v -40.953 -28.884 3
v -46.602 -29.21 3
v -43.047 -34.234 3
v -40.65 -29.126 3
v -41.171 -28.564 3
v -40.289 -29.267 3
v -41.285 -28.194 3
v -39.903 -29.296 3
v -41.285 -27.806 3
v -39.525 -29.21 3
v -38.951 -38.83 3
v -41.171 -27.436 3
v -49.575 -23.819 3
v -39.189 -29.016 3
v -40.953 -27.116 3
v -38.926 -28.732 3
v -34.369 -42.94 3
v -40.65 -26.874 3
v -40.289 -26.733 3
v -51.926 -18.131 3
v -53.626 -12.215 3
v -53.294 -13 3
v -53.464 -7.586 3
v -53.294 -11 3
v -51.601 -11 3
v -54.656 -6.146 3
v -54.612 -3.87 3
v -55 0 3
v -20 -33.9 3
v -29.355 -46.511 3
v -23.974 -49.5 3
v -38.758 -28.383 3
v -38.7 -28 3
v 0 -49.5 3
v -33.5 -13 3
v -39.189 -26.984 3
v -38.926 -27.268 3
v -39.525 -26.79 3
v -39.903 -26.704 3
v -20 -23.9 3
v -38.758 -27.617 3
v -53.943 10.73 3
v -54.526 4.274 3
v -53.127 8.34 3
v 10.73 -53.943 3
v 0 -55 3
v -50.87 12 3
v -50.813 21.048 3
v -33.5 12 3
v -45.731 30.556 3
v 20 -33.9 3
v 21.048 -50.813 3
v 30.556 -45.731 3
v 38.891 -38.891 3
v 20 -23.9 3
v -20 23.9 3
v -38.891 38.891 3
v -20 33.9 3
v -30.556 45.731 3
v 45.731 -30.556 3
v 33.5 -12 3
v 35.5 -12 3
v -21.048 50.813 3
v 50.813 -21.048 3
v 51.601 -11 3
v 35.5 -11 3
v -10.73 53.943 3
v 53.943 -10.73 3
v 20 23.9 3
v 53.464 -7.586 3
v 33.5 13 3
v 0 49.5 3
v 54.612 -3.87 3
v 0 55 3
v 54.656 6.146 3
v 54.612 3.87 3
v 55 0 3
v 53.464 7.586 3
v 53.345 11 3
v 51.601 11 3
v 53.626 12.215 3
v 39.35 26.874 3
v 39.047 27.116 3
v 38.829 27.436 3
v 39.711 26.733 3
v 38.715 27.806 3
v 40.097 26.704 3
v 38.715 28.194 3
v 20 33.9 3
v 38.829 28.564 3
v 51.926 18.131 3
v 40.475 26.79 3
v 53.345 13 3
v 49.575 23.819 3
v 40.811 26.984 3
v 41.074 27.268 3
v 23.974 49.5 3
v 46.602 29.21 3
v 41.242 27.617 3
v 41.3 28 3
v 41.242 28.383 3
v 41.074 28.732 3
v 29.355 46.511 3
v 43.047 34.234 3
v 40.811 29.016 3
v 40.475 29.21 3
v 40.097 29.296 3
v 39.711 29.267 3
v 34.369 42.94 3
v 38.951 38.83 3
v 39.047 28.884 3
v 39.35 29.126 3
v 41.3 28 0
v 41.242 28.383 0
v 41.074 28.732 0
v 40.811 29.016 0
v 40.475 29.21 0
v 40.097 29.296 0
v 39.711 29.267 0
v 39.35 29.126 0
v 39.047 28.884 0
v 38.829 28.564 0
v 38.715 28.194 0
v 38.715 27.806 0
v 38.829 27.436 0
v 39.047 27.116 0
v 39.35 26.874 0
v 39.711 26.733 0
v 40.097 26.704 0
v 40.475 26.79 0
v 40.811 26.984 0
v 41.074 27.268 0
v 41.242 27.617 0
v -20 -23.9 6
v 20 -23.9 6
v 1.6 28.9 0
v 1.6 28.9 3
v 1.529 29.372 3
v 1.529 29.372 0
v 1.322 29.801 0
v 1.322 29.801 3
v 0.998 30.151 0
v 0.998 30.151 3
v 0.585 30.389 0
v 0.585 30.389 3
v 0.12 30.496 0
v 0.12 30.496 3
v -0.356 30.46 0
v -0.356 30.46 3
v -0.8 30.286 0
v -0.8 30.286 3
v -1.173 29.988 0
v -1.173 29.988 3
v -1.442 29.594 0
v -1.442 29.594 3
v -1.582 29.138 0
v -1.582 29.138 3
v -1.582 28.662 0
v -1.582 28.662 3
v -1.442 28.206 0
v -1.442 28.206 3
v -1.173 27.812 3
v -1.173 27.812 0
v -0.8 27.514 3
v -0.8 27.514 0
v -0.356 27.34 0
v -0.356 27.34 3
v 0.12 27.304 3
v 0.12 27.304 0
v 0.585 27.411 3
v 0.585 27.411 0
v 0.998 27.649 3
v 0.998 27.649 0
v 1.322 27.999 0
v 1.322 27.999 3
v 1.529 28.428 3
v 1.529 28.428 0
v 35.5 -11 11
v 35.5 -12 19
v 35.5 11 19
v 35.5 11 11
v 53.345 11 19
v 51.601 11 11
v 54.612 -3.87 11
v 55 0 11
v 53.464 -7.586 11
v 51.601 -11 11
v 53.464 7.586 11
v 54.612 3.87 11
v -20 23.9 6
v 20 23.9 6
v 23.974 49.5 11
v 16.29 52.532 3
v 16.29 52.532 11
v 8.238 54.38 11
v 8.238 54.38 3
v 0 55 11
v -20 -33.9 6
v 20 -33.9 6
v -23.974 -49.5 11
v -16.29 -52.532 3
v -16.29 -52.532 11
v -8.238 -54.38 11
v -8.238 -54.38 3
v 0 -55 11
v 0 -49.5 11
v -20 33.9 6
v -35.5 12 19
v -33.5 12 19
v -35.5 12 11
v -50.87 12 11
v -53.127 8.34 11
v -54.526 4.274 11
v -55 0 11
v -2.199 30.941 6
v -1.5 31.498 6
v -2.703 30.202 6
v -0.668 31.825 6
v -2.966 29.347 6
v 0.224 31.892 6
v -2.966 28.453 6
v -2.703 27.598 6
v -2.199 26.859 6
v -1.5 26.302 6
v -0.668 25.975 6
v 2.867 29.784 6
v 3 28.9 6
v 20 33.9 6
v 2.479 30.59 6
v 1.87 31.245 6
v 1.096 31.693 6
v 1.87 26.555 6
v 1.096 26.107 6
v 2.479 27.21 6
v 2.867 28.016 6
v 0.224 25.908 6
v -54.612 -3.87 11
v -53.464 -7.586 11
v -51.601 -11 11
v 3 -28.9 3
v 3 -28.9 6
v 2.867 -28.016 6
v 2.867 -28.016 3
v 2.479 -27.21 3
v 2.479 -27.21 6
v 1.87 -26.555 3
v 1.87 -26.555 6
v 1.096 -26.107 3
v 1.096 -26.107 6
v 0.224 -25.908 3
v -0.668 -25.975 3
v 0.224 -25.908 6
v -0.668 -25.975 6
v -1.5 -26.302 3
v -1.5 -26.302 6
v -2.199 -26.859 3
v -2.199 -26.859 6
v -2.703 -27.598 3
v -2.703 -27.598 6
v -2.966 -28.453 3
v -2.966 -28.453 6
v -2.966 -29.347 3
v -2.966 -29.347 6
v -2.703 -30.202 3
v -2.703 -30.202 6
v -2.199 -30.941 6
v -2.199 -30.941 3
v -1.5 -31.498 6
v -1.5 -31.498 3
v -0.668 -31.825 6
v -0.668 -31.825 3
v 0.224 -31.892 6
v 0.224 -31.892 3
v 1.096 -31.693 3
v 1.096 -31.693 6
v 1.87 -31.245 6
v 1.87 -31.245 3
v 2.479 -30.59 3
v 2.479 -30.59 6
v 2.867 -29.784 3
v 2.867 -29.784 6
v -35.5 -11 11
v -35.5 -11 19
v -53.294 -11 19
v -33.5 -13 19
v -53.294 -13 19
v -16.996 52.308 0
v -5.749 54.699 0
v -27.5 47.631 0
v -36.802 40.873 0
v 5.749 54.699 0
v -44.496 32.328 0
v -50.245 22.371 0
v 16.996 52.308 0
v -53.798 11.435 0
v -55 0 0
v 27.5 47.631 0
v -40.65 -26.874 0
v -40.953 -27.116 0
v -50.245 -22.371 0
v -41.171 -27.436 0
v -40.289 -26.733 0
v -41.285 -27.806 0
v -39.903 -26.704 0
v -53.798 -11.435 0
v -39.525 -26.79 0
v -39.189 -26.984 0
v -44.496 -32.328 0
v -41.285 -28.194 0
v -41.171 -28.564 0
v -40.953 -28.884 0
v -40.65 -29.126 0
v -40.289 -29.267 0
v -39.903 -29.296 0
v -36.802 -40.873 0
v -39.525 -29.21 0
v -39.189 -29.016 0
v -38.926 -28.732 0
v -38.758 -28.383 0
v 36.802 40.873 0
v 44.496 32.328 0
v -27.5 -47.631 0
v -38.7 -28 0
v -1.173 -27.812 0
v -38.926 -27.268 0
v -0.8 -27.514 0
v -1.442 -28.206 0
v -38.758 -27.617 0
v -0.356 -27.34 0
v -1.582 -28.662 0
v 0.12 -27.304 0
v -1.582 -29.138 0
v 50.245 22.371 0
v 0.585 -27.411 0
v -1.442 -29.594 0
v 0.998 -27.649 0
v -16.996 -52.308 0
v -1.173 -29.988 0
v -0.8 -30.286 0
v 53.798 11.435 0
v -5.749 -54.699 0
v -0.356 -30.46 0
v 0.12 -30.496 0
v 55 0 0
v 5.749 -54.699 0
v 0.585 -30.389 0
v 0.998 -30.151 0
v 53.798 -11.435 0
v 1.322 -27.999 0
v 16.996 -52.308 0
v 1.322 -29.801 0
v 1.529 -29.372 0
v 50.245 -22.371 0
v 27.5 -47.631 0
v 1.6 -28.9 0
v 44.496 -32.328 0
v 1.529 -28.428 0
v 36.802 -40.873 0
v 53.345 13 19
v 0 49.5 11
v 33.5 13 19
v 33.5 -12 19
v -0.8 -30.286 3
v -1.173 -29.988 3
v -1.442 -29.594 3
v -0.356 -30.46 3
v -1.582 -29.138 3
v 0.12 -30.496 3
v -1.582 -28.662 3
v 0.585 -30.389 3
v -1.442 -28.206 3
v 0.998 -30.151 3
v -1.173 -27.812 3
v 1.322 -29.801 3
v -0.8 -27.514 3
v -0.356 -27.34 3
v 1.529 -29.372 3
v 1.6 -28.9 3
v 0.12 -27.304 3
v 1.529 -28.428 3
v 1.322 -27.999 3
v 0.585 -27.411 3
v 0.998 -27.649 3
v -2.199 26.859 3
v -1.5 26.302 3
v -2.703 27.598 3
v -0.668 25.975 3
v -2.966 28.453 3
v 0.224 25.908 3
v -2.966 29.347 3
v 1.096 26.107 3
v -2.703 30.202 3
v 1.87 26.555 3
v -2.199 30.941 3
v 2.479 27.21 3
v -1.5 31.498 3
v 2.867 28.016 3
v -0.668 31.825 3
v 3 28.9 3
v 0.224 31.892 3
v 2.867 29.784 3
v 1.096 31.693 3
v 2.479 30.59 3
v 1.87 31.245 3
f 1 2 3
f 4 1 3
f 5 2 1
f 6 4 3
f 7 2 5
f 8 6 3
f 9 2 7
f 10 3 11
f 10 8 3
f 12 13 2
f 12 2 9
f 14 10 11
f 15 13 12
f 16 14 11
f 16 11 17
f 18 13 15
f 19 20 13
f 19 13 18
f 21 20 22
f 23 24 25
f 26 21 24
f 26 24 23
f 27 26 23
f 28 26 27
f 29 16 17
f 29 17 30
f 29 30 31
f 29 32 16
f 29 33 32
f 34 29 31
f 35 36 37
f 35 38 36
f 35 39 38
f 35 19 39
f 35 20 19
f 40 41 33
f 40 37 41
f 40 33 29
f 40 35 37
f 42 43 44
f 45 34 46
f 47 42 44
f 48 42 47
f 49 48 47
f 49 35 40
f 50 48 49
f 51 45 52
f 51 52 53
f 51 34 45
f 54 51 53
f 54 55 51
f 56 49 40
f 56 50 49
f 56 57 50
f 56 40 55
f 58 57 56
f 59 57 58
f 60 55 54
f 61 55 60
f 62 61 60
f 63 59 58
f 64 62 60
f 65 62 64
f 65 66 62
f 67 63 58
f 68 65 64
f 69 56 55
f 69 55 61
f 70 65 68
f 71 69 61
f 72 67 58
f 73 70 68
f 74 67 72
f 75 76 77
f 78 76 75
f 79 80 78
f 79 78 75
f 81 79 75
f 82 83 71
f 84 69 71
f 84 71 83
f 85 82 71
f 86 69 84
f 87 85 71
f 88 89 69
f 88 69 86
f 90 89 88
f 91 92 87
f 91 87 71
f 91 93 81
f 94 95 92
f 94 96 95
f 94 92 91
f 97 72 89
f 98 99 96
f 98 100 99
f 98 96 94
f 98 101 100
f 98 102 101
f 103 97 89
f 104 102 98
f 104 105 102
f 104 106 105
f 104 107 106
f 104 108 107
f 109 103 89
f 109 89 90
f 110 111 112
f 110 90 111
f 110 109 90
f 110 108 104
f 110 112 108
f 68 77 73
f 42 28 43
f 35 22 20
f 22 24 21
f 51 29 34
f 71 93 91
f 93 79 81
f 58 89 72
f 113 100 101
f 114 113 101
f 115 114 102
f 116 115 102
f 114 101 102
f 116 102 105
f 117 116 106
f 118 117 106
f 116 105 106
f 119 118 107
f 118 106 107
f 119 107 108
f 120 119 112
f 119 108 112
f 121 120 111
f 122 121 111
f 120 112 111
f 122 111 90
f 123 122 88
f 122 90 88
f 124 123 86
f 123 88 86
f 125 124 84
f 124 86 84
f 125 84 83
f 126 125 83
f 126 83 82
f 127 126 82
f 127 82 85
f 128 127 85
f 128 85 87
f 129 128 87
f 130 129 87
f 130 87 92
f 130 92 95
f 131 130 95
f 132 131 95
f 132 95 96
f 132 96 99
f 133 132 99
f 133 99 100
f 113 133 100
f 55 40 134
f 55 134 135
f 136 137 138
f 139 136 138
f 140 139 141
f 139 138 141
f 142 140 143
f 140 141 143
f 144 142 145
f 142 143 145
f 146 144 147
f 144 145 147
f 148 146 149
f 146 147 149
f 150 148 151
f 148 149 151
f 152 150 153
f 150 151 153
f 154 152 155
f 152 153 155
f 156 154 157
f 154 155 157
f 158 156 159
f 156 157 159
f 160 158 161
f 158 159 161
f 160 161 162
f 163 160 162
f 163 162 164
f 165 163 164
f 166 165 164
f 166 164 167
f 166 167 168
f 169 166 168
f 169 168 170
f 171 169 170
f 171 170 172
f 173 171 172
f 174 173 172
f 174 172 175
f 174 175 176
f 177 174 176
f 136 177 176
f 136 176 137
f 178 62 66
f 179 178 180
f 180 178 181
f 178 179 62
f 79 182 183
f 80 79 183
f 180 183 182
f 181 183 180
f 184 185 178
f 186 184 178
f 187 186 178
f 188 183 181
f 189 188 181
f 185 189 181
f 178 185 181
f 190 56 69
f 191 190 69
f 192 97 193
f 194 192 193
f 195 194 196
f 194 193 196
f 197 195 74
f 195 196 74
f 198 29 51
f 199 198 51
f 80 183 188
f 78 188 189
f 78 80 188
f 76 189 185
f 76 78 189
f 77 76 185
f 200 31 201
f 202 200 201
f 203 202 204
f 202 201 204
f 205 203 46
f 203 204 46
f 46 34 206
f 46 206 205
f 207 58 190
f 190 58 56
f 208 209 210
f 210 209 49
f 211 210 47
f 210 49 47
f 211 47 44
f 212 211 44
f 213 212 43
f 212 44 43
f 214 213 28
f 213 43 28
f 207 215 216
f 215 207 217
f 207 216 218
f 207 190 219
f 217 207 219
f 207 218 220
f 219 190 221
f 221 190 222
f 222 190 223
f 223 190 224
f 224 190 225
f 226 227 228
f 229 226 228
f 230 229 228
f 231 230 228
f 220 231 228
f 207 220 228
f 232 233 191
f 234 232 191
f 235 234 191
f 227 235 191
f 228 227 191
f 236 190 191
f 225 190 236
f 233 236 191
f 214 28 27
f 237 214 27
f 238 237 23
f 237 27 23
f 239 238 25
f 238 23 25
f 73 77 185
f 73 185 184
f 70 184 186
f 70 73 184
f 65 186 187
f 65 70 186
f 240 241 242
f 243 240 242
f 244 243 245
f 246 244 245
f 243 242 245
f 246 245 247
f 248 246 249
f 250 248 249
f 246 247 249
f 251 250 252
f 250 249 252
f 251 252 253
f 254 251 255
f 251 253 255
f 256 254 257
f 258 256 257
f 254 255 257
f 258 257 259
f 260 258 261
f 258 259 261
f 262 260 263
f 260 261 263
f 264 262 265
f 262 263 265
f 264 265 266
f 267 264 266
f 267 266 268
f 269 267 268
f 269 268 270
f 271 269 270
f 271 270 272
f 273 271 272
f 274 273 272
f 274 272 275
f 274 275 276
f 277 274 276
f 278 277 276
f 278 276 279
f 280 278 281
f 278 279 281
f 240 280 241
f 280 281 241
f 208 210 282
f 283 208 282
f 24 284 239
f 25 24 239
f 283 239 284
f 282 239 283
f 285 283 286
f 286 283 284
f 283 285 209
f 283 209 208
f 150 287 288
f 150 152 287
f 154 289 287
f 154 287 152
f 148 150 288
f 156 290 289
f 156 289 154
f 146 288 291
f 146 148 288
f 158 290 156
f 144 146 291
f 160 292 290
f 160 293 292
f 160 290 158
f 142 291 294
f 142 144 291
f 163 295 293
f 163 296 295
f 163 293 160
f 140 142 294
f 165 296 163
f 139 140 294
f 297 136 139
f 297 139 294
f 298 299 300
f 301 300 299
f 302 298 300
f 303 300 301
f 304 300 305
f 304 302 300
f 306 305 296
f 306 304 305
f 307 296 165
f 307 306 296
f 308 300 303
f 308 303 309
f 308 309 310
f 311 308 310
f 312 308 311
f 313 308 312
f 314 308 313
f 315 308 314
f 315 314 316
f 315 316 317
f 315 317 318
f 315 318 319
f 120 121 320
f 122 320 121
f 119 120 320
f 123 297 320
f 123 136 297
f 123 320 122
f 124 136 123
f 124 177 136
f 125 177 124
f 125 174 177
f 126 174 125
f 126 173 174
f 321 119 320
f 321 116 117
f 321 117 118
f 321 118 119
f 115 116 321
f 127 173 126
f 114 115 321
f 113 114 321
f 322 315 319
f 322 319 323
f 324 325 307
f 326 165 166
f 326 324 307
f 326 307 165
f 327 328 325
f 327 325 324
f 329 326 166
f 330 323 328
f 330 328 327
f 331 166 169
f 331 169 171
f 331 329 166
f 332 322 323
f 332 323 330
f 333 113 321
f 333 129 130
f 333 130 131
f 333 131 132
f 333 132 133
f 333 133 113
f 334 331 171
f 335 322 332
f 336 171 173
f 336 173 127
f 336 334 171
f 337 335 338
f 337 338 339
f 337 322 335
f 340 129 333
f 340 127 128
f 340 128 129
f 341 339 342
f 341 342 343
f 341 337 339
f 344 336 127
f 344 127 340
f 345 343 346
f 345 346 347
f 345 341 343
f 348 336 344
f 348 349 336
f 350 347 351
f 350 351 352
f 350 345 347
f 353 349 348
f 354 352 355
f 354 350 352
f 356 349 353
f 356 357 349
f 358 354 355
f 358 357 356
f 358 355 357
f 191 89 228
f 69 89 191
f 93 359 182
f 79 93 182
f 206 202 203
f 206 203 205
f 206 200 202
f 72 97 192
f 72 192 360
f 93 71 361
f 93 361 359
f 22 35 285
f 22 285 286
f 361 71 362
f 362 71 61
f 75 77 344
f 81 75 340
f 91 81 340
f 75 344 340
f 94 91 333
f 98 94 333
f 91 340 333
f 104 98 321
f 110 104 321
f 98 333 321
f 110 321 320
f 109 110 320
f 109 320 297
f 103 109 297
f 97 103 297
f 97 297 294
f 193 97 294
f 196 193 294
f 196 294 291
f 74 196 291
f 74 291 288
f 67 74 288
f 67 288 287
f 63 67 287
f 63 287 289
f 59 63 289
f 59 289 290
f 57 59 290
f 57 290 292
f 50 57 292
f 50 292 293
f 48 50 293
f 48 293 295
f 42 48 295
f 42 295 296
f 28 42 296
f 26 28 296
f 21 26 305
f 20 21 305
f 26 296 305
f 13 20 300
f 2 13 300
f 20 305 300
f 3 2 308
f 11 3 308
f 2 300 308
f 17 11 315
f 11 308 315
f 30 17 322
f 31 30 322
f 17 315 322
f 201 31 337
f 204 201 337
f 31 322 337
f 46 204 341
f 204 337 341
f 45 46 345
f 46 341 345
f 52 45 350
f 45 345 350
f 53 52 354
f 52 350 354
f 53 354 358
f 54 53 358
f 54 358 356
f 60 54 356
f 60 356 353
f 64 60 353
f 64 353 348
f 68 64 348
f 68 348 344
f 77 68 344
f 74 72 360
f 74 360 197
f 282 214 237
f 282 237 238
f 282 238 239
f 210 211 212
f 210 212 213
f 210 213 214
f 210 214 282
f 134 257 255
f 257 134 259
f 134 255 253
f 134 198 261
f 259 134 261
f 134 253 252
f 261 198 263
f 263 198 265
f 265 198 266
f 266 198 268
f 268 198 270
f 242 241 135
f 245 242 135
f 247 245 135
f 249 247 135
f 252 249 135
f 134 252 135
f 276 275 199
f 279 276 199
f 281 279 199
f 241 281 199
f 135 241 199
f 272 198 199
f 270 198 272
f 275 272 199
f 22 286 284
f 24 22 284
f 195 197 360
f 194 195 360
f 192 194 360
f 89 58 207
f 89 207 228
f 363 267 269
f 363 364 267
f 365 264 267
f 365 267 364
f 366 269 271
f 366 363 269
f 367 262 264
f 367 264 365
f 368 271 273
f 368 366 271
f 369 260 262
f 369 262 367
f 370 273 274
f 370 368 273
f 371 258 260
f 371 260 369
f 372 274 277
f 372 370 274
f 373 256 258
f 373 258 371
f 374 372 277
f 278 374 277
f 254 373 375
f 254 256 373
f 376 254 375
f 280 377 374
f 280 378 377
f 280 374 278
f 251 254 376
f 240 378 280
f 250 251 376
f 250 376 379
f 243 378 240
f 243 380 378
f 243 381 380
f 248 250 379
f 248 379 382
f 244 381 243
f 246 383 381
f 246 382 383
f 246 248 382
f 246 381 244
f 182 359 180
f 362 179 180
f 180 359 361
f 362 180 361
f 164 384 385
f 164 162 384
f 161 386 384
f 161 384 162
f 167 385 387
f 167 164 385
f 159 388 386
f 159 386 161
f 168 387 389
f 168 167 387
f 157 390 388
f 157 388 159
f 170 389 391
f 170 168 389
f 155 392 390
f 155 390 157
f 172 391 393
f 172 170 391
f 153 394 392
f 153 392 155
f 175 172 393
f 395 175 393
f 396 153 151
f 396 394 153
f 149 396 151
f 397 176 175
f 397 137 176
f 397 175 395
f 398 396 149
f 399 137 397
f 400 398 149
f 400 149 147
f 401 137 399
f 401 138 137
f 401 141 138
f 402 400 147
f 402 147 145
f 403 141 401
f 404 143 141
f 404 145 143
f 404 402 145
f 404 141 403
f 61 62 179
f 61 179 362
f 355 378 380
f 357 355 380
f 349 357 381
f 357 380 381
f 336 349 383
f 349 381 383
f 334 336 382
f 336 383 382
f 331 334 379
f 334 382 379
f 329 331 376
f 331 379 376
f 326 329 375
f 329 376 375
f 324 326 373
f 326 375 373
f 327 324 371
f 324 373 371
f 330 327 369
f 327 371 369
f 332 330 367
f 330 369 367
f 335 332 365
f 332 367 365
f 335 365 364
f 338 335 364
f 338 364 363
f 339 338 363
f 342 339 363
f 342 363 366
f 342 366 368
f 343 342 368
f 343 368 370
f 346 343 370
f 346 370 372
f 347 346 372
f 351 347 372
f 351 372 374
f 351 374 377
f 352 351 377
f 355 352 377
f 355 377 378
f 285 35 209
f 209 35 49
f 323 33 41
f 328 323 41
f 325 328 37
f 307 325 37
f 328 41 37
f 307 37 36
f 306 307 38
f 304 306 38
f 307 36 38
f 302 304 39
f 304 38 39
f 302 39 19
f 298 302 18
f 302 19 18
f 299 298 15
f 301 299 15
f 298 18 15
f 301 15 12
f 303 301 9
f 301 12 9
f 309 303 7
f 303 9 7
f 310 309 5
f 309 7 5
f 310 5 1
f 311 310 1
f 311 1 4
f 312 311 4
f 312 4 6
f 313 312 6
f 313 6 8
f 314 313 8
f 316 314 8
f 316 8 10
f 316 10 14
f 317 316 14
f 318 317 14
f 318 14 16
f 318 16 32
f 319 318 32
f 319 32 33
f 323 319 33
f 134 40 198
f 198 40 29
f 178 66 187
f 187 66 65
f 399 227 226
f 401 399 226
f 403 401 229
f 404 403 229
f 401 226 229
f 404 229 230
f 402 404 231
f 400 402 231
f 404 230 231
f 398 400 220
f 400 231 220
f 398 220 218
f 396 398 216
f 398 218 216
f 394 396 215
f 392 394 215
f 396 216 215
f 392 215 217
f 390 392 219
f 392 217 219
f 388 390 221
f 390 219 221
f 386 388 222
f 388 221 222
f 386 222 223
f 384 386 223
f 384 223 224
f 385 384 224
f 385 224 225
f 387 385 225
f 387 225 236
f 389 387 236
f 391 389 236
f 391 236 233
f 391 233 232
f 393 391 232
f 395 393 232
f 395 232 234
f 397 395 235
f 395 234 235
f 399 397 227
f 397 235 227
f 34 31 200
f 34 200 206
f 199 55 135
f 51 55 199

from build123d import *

# Parameters (mm, degrees)
SKETCH_R        = 55
PAD_DEPTH       = 3
PAD001_DEPTH    = 16
PAD002_DEPTH    = 8
SKETCH003_R     = 1.3
POCKET_DEPTH    = 5
SKETCH004_W     = 40
SKETCH004_H     = 10
SKETCH004_R     = 1.6
PAD003_DEPTH    = 6
SKETCH005_R     = 3
POCKET001_DEPTH = 3
SKETCH006_R     = 1.6
POCKET002_DEPTH = 6
PAD004_DEPTH    = 8


with BuildPart() as part:
    # Sketch → Pad (new body)
    with BuildSketch(Plane.XY):
        Circle(SKETCH_R)
    extrude(amount=PAD_DEPTH)

    # Sketch001 (on Face3 of Pad) → Pad001 (join)
    with BuildSketch(Plane.XY.offset(3)):
        Polygon((33.500008, 0), (33.500008, 13), (53.345406, 13), (53.345406, 11), (35.5, 11), (35.5, -0.005684), (35.5, -12), (33.500008, -12), align=None)
        Polygon((-33.5, 0), (-33.5, -13), (-53.293575, -13), (-53.293575, -11), (-35.5, -11), (-35.5, 0.001212), (-35.5, 12), (-33.5, 12), align=None)
    extrude(amount=PAD001_DEPTH)

    # Sketch002 (on Face3 of Pad001) → Pad002 (join)
    with BuildSketch(Plane.XY.offset(3)):
        with BuildLine():
            ThreePointArc((-23.973944, -49.5), (-12.298374, -53.607369), (0, -55))
            Line((0, -49.5), (0, -55))
            Line((-23.973944, -49.5), (0, -49.5))
        make_face()
        with BuildLine():
            ThreePointArc((23.973944, 49.5), (12.298374, 53.607369), (0, 55))
            Line((0, 49.5), (0, 55))
            Line((23.973944, 49.5), (0, 49.5))
        make_face()
    extrude(amount=PAD002_DEPTH)

    # Sketch003 (on Face3 of Pad002) → Pocket (cut)
    with BuildSketch(Plane.XY.offset(3)):
        with Locations((-40, -28)):
            Circle(SKETCH003_R)
        with Locations((40, 28)):
            Circle(SKETCH003_R)
    extrude(amount=-POCKET_DEPTH, mode=Mode.SUBTRACT)

    # Sketch004 (on Face2 of Pocket) → Pad003 (join)
    with BuildSketch(Plane(origin=(0, 0, 0), x_dir=(1, 0, 0), z_dir=(0, 0, -1))):
        with Locations((0, -28.9)):
            Rectangle(SKETCH004_W, SKETCH004_H)
        with Locations((0, -28.9)):
            Circle(SKETCH004_R, mode=Mode.SUBTRACT)
        with Locations((0, 28.9)):
            Rectangle(SKETCH004_W, SKETCH004_H)
        with Locations((0, 28.9)):
            Circle(SKETCH004_R, mode=Mode.SUBTRACT)
    extrude(amount=-PAD003_DEPTH)

    # Sketch005 (on Face42 of Pad003) → Pocket001 (cut)
    with BuildSketch(Plane.XY.offset(6)):
        with Locations((0, 28.9)):
            Circle(SKETCH005_R)
        with Locations((0, -28.9)):
            Circle(SKETCH005_R)
    extrude(amount=-POCKET001_DEPTH, mode=Mode.SUBTRACT)

    # Sketch006 (on Face42 of Pocket001) → Pocket002 (cut)
    with BuildSketch(Plane.XY.offset(6)):
        with Locations((0, 28.9)):
            Circle(SKETCH006_R)
        with Locations((0, -28.9)):
            Circle(SKETCH006_R)
    extrude(amount=-POCKET002_DEPTH, mode=Mode.SUBTRACT)

    # Sketch007 (on Face3 of Pocket002) → Pad004 (join)
    with BuildSketch(Plane.XY.offset(3)):
        with BuildLine():
            Line((-35.5, 0), (-35.5, 12))
            Line((-35.5, 12), (-50.870426, 12))
            ThreePointArc((-50.870426, 12), (-53.938727, 6.34534), (-55, 0))
            ThreePointArc((-55, 0), (-54.130945, -5.756552), (-51.601242, -11))
            Line((-35.5, -11), (-51.601242, -11))
            Line((-35.5, 0), (-35.5, -11))
        make_face()
    pad004 = extrude(amount=PAD004_DEPTH)

    # Mirrored: Pad004 across Sketch007 V_Axis
    add(pad004.mirror(Plane(origin=(0, 0, 3), x_dir=(0, 0, 1), z_dir=(1, 0, 0))))


solid = part.part
